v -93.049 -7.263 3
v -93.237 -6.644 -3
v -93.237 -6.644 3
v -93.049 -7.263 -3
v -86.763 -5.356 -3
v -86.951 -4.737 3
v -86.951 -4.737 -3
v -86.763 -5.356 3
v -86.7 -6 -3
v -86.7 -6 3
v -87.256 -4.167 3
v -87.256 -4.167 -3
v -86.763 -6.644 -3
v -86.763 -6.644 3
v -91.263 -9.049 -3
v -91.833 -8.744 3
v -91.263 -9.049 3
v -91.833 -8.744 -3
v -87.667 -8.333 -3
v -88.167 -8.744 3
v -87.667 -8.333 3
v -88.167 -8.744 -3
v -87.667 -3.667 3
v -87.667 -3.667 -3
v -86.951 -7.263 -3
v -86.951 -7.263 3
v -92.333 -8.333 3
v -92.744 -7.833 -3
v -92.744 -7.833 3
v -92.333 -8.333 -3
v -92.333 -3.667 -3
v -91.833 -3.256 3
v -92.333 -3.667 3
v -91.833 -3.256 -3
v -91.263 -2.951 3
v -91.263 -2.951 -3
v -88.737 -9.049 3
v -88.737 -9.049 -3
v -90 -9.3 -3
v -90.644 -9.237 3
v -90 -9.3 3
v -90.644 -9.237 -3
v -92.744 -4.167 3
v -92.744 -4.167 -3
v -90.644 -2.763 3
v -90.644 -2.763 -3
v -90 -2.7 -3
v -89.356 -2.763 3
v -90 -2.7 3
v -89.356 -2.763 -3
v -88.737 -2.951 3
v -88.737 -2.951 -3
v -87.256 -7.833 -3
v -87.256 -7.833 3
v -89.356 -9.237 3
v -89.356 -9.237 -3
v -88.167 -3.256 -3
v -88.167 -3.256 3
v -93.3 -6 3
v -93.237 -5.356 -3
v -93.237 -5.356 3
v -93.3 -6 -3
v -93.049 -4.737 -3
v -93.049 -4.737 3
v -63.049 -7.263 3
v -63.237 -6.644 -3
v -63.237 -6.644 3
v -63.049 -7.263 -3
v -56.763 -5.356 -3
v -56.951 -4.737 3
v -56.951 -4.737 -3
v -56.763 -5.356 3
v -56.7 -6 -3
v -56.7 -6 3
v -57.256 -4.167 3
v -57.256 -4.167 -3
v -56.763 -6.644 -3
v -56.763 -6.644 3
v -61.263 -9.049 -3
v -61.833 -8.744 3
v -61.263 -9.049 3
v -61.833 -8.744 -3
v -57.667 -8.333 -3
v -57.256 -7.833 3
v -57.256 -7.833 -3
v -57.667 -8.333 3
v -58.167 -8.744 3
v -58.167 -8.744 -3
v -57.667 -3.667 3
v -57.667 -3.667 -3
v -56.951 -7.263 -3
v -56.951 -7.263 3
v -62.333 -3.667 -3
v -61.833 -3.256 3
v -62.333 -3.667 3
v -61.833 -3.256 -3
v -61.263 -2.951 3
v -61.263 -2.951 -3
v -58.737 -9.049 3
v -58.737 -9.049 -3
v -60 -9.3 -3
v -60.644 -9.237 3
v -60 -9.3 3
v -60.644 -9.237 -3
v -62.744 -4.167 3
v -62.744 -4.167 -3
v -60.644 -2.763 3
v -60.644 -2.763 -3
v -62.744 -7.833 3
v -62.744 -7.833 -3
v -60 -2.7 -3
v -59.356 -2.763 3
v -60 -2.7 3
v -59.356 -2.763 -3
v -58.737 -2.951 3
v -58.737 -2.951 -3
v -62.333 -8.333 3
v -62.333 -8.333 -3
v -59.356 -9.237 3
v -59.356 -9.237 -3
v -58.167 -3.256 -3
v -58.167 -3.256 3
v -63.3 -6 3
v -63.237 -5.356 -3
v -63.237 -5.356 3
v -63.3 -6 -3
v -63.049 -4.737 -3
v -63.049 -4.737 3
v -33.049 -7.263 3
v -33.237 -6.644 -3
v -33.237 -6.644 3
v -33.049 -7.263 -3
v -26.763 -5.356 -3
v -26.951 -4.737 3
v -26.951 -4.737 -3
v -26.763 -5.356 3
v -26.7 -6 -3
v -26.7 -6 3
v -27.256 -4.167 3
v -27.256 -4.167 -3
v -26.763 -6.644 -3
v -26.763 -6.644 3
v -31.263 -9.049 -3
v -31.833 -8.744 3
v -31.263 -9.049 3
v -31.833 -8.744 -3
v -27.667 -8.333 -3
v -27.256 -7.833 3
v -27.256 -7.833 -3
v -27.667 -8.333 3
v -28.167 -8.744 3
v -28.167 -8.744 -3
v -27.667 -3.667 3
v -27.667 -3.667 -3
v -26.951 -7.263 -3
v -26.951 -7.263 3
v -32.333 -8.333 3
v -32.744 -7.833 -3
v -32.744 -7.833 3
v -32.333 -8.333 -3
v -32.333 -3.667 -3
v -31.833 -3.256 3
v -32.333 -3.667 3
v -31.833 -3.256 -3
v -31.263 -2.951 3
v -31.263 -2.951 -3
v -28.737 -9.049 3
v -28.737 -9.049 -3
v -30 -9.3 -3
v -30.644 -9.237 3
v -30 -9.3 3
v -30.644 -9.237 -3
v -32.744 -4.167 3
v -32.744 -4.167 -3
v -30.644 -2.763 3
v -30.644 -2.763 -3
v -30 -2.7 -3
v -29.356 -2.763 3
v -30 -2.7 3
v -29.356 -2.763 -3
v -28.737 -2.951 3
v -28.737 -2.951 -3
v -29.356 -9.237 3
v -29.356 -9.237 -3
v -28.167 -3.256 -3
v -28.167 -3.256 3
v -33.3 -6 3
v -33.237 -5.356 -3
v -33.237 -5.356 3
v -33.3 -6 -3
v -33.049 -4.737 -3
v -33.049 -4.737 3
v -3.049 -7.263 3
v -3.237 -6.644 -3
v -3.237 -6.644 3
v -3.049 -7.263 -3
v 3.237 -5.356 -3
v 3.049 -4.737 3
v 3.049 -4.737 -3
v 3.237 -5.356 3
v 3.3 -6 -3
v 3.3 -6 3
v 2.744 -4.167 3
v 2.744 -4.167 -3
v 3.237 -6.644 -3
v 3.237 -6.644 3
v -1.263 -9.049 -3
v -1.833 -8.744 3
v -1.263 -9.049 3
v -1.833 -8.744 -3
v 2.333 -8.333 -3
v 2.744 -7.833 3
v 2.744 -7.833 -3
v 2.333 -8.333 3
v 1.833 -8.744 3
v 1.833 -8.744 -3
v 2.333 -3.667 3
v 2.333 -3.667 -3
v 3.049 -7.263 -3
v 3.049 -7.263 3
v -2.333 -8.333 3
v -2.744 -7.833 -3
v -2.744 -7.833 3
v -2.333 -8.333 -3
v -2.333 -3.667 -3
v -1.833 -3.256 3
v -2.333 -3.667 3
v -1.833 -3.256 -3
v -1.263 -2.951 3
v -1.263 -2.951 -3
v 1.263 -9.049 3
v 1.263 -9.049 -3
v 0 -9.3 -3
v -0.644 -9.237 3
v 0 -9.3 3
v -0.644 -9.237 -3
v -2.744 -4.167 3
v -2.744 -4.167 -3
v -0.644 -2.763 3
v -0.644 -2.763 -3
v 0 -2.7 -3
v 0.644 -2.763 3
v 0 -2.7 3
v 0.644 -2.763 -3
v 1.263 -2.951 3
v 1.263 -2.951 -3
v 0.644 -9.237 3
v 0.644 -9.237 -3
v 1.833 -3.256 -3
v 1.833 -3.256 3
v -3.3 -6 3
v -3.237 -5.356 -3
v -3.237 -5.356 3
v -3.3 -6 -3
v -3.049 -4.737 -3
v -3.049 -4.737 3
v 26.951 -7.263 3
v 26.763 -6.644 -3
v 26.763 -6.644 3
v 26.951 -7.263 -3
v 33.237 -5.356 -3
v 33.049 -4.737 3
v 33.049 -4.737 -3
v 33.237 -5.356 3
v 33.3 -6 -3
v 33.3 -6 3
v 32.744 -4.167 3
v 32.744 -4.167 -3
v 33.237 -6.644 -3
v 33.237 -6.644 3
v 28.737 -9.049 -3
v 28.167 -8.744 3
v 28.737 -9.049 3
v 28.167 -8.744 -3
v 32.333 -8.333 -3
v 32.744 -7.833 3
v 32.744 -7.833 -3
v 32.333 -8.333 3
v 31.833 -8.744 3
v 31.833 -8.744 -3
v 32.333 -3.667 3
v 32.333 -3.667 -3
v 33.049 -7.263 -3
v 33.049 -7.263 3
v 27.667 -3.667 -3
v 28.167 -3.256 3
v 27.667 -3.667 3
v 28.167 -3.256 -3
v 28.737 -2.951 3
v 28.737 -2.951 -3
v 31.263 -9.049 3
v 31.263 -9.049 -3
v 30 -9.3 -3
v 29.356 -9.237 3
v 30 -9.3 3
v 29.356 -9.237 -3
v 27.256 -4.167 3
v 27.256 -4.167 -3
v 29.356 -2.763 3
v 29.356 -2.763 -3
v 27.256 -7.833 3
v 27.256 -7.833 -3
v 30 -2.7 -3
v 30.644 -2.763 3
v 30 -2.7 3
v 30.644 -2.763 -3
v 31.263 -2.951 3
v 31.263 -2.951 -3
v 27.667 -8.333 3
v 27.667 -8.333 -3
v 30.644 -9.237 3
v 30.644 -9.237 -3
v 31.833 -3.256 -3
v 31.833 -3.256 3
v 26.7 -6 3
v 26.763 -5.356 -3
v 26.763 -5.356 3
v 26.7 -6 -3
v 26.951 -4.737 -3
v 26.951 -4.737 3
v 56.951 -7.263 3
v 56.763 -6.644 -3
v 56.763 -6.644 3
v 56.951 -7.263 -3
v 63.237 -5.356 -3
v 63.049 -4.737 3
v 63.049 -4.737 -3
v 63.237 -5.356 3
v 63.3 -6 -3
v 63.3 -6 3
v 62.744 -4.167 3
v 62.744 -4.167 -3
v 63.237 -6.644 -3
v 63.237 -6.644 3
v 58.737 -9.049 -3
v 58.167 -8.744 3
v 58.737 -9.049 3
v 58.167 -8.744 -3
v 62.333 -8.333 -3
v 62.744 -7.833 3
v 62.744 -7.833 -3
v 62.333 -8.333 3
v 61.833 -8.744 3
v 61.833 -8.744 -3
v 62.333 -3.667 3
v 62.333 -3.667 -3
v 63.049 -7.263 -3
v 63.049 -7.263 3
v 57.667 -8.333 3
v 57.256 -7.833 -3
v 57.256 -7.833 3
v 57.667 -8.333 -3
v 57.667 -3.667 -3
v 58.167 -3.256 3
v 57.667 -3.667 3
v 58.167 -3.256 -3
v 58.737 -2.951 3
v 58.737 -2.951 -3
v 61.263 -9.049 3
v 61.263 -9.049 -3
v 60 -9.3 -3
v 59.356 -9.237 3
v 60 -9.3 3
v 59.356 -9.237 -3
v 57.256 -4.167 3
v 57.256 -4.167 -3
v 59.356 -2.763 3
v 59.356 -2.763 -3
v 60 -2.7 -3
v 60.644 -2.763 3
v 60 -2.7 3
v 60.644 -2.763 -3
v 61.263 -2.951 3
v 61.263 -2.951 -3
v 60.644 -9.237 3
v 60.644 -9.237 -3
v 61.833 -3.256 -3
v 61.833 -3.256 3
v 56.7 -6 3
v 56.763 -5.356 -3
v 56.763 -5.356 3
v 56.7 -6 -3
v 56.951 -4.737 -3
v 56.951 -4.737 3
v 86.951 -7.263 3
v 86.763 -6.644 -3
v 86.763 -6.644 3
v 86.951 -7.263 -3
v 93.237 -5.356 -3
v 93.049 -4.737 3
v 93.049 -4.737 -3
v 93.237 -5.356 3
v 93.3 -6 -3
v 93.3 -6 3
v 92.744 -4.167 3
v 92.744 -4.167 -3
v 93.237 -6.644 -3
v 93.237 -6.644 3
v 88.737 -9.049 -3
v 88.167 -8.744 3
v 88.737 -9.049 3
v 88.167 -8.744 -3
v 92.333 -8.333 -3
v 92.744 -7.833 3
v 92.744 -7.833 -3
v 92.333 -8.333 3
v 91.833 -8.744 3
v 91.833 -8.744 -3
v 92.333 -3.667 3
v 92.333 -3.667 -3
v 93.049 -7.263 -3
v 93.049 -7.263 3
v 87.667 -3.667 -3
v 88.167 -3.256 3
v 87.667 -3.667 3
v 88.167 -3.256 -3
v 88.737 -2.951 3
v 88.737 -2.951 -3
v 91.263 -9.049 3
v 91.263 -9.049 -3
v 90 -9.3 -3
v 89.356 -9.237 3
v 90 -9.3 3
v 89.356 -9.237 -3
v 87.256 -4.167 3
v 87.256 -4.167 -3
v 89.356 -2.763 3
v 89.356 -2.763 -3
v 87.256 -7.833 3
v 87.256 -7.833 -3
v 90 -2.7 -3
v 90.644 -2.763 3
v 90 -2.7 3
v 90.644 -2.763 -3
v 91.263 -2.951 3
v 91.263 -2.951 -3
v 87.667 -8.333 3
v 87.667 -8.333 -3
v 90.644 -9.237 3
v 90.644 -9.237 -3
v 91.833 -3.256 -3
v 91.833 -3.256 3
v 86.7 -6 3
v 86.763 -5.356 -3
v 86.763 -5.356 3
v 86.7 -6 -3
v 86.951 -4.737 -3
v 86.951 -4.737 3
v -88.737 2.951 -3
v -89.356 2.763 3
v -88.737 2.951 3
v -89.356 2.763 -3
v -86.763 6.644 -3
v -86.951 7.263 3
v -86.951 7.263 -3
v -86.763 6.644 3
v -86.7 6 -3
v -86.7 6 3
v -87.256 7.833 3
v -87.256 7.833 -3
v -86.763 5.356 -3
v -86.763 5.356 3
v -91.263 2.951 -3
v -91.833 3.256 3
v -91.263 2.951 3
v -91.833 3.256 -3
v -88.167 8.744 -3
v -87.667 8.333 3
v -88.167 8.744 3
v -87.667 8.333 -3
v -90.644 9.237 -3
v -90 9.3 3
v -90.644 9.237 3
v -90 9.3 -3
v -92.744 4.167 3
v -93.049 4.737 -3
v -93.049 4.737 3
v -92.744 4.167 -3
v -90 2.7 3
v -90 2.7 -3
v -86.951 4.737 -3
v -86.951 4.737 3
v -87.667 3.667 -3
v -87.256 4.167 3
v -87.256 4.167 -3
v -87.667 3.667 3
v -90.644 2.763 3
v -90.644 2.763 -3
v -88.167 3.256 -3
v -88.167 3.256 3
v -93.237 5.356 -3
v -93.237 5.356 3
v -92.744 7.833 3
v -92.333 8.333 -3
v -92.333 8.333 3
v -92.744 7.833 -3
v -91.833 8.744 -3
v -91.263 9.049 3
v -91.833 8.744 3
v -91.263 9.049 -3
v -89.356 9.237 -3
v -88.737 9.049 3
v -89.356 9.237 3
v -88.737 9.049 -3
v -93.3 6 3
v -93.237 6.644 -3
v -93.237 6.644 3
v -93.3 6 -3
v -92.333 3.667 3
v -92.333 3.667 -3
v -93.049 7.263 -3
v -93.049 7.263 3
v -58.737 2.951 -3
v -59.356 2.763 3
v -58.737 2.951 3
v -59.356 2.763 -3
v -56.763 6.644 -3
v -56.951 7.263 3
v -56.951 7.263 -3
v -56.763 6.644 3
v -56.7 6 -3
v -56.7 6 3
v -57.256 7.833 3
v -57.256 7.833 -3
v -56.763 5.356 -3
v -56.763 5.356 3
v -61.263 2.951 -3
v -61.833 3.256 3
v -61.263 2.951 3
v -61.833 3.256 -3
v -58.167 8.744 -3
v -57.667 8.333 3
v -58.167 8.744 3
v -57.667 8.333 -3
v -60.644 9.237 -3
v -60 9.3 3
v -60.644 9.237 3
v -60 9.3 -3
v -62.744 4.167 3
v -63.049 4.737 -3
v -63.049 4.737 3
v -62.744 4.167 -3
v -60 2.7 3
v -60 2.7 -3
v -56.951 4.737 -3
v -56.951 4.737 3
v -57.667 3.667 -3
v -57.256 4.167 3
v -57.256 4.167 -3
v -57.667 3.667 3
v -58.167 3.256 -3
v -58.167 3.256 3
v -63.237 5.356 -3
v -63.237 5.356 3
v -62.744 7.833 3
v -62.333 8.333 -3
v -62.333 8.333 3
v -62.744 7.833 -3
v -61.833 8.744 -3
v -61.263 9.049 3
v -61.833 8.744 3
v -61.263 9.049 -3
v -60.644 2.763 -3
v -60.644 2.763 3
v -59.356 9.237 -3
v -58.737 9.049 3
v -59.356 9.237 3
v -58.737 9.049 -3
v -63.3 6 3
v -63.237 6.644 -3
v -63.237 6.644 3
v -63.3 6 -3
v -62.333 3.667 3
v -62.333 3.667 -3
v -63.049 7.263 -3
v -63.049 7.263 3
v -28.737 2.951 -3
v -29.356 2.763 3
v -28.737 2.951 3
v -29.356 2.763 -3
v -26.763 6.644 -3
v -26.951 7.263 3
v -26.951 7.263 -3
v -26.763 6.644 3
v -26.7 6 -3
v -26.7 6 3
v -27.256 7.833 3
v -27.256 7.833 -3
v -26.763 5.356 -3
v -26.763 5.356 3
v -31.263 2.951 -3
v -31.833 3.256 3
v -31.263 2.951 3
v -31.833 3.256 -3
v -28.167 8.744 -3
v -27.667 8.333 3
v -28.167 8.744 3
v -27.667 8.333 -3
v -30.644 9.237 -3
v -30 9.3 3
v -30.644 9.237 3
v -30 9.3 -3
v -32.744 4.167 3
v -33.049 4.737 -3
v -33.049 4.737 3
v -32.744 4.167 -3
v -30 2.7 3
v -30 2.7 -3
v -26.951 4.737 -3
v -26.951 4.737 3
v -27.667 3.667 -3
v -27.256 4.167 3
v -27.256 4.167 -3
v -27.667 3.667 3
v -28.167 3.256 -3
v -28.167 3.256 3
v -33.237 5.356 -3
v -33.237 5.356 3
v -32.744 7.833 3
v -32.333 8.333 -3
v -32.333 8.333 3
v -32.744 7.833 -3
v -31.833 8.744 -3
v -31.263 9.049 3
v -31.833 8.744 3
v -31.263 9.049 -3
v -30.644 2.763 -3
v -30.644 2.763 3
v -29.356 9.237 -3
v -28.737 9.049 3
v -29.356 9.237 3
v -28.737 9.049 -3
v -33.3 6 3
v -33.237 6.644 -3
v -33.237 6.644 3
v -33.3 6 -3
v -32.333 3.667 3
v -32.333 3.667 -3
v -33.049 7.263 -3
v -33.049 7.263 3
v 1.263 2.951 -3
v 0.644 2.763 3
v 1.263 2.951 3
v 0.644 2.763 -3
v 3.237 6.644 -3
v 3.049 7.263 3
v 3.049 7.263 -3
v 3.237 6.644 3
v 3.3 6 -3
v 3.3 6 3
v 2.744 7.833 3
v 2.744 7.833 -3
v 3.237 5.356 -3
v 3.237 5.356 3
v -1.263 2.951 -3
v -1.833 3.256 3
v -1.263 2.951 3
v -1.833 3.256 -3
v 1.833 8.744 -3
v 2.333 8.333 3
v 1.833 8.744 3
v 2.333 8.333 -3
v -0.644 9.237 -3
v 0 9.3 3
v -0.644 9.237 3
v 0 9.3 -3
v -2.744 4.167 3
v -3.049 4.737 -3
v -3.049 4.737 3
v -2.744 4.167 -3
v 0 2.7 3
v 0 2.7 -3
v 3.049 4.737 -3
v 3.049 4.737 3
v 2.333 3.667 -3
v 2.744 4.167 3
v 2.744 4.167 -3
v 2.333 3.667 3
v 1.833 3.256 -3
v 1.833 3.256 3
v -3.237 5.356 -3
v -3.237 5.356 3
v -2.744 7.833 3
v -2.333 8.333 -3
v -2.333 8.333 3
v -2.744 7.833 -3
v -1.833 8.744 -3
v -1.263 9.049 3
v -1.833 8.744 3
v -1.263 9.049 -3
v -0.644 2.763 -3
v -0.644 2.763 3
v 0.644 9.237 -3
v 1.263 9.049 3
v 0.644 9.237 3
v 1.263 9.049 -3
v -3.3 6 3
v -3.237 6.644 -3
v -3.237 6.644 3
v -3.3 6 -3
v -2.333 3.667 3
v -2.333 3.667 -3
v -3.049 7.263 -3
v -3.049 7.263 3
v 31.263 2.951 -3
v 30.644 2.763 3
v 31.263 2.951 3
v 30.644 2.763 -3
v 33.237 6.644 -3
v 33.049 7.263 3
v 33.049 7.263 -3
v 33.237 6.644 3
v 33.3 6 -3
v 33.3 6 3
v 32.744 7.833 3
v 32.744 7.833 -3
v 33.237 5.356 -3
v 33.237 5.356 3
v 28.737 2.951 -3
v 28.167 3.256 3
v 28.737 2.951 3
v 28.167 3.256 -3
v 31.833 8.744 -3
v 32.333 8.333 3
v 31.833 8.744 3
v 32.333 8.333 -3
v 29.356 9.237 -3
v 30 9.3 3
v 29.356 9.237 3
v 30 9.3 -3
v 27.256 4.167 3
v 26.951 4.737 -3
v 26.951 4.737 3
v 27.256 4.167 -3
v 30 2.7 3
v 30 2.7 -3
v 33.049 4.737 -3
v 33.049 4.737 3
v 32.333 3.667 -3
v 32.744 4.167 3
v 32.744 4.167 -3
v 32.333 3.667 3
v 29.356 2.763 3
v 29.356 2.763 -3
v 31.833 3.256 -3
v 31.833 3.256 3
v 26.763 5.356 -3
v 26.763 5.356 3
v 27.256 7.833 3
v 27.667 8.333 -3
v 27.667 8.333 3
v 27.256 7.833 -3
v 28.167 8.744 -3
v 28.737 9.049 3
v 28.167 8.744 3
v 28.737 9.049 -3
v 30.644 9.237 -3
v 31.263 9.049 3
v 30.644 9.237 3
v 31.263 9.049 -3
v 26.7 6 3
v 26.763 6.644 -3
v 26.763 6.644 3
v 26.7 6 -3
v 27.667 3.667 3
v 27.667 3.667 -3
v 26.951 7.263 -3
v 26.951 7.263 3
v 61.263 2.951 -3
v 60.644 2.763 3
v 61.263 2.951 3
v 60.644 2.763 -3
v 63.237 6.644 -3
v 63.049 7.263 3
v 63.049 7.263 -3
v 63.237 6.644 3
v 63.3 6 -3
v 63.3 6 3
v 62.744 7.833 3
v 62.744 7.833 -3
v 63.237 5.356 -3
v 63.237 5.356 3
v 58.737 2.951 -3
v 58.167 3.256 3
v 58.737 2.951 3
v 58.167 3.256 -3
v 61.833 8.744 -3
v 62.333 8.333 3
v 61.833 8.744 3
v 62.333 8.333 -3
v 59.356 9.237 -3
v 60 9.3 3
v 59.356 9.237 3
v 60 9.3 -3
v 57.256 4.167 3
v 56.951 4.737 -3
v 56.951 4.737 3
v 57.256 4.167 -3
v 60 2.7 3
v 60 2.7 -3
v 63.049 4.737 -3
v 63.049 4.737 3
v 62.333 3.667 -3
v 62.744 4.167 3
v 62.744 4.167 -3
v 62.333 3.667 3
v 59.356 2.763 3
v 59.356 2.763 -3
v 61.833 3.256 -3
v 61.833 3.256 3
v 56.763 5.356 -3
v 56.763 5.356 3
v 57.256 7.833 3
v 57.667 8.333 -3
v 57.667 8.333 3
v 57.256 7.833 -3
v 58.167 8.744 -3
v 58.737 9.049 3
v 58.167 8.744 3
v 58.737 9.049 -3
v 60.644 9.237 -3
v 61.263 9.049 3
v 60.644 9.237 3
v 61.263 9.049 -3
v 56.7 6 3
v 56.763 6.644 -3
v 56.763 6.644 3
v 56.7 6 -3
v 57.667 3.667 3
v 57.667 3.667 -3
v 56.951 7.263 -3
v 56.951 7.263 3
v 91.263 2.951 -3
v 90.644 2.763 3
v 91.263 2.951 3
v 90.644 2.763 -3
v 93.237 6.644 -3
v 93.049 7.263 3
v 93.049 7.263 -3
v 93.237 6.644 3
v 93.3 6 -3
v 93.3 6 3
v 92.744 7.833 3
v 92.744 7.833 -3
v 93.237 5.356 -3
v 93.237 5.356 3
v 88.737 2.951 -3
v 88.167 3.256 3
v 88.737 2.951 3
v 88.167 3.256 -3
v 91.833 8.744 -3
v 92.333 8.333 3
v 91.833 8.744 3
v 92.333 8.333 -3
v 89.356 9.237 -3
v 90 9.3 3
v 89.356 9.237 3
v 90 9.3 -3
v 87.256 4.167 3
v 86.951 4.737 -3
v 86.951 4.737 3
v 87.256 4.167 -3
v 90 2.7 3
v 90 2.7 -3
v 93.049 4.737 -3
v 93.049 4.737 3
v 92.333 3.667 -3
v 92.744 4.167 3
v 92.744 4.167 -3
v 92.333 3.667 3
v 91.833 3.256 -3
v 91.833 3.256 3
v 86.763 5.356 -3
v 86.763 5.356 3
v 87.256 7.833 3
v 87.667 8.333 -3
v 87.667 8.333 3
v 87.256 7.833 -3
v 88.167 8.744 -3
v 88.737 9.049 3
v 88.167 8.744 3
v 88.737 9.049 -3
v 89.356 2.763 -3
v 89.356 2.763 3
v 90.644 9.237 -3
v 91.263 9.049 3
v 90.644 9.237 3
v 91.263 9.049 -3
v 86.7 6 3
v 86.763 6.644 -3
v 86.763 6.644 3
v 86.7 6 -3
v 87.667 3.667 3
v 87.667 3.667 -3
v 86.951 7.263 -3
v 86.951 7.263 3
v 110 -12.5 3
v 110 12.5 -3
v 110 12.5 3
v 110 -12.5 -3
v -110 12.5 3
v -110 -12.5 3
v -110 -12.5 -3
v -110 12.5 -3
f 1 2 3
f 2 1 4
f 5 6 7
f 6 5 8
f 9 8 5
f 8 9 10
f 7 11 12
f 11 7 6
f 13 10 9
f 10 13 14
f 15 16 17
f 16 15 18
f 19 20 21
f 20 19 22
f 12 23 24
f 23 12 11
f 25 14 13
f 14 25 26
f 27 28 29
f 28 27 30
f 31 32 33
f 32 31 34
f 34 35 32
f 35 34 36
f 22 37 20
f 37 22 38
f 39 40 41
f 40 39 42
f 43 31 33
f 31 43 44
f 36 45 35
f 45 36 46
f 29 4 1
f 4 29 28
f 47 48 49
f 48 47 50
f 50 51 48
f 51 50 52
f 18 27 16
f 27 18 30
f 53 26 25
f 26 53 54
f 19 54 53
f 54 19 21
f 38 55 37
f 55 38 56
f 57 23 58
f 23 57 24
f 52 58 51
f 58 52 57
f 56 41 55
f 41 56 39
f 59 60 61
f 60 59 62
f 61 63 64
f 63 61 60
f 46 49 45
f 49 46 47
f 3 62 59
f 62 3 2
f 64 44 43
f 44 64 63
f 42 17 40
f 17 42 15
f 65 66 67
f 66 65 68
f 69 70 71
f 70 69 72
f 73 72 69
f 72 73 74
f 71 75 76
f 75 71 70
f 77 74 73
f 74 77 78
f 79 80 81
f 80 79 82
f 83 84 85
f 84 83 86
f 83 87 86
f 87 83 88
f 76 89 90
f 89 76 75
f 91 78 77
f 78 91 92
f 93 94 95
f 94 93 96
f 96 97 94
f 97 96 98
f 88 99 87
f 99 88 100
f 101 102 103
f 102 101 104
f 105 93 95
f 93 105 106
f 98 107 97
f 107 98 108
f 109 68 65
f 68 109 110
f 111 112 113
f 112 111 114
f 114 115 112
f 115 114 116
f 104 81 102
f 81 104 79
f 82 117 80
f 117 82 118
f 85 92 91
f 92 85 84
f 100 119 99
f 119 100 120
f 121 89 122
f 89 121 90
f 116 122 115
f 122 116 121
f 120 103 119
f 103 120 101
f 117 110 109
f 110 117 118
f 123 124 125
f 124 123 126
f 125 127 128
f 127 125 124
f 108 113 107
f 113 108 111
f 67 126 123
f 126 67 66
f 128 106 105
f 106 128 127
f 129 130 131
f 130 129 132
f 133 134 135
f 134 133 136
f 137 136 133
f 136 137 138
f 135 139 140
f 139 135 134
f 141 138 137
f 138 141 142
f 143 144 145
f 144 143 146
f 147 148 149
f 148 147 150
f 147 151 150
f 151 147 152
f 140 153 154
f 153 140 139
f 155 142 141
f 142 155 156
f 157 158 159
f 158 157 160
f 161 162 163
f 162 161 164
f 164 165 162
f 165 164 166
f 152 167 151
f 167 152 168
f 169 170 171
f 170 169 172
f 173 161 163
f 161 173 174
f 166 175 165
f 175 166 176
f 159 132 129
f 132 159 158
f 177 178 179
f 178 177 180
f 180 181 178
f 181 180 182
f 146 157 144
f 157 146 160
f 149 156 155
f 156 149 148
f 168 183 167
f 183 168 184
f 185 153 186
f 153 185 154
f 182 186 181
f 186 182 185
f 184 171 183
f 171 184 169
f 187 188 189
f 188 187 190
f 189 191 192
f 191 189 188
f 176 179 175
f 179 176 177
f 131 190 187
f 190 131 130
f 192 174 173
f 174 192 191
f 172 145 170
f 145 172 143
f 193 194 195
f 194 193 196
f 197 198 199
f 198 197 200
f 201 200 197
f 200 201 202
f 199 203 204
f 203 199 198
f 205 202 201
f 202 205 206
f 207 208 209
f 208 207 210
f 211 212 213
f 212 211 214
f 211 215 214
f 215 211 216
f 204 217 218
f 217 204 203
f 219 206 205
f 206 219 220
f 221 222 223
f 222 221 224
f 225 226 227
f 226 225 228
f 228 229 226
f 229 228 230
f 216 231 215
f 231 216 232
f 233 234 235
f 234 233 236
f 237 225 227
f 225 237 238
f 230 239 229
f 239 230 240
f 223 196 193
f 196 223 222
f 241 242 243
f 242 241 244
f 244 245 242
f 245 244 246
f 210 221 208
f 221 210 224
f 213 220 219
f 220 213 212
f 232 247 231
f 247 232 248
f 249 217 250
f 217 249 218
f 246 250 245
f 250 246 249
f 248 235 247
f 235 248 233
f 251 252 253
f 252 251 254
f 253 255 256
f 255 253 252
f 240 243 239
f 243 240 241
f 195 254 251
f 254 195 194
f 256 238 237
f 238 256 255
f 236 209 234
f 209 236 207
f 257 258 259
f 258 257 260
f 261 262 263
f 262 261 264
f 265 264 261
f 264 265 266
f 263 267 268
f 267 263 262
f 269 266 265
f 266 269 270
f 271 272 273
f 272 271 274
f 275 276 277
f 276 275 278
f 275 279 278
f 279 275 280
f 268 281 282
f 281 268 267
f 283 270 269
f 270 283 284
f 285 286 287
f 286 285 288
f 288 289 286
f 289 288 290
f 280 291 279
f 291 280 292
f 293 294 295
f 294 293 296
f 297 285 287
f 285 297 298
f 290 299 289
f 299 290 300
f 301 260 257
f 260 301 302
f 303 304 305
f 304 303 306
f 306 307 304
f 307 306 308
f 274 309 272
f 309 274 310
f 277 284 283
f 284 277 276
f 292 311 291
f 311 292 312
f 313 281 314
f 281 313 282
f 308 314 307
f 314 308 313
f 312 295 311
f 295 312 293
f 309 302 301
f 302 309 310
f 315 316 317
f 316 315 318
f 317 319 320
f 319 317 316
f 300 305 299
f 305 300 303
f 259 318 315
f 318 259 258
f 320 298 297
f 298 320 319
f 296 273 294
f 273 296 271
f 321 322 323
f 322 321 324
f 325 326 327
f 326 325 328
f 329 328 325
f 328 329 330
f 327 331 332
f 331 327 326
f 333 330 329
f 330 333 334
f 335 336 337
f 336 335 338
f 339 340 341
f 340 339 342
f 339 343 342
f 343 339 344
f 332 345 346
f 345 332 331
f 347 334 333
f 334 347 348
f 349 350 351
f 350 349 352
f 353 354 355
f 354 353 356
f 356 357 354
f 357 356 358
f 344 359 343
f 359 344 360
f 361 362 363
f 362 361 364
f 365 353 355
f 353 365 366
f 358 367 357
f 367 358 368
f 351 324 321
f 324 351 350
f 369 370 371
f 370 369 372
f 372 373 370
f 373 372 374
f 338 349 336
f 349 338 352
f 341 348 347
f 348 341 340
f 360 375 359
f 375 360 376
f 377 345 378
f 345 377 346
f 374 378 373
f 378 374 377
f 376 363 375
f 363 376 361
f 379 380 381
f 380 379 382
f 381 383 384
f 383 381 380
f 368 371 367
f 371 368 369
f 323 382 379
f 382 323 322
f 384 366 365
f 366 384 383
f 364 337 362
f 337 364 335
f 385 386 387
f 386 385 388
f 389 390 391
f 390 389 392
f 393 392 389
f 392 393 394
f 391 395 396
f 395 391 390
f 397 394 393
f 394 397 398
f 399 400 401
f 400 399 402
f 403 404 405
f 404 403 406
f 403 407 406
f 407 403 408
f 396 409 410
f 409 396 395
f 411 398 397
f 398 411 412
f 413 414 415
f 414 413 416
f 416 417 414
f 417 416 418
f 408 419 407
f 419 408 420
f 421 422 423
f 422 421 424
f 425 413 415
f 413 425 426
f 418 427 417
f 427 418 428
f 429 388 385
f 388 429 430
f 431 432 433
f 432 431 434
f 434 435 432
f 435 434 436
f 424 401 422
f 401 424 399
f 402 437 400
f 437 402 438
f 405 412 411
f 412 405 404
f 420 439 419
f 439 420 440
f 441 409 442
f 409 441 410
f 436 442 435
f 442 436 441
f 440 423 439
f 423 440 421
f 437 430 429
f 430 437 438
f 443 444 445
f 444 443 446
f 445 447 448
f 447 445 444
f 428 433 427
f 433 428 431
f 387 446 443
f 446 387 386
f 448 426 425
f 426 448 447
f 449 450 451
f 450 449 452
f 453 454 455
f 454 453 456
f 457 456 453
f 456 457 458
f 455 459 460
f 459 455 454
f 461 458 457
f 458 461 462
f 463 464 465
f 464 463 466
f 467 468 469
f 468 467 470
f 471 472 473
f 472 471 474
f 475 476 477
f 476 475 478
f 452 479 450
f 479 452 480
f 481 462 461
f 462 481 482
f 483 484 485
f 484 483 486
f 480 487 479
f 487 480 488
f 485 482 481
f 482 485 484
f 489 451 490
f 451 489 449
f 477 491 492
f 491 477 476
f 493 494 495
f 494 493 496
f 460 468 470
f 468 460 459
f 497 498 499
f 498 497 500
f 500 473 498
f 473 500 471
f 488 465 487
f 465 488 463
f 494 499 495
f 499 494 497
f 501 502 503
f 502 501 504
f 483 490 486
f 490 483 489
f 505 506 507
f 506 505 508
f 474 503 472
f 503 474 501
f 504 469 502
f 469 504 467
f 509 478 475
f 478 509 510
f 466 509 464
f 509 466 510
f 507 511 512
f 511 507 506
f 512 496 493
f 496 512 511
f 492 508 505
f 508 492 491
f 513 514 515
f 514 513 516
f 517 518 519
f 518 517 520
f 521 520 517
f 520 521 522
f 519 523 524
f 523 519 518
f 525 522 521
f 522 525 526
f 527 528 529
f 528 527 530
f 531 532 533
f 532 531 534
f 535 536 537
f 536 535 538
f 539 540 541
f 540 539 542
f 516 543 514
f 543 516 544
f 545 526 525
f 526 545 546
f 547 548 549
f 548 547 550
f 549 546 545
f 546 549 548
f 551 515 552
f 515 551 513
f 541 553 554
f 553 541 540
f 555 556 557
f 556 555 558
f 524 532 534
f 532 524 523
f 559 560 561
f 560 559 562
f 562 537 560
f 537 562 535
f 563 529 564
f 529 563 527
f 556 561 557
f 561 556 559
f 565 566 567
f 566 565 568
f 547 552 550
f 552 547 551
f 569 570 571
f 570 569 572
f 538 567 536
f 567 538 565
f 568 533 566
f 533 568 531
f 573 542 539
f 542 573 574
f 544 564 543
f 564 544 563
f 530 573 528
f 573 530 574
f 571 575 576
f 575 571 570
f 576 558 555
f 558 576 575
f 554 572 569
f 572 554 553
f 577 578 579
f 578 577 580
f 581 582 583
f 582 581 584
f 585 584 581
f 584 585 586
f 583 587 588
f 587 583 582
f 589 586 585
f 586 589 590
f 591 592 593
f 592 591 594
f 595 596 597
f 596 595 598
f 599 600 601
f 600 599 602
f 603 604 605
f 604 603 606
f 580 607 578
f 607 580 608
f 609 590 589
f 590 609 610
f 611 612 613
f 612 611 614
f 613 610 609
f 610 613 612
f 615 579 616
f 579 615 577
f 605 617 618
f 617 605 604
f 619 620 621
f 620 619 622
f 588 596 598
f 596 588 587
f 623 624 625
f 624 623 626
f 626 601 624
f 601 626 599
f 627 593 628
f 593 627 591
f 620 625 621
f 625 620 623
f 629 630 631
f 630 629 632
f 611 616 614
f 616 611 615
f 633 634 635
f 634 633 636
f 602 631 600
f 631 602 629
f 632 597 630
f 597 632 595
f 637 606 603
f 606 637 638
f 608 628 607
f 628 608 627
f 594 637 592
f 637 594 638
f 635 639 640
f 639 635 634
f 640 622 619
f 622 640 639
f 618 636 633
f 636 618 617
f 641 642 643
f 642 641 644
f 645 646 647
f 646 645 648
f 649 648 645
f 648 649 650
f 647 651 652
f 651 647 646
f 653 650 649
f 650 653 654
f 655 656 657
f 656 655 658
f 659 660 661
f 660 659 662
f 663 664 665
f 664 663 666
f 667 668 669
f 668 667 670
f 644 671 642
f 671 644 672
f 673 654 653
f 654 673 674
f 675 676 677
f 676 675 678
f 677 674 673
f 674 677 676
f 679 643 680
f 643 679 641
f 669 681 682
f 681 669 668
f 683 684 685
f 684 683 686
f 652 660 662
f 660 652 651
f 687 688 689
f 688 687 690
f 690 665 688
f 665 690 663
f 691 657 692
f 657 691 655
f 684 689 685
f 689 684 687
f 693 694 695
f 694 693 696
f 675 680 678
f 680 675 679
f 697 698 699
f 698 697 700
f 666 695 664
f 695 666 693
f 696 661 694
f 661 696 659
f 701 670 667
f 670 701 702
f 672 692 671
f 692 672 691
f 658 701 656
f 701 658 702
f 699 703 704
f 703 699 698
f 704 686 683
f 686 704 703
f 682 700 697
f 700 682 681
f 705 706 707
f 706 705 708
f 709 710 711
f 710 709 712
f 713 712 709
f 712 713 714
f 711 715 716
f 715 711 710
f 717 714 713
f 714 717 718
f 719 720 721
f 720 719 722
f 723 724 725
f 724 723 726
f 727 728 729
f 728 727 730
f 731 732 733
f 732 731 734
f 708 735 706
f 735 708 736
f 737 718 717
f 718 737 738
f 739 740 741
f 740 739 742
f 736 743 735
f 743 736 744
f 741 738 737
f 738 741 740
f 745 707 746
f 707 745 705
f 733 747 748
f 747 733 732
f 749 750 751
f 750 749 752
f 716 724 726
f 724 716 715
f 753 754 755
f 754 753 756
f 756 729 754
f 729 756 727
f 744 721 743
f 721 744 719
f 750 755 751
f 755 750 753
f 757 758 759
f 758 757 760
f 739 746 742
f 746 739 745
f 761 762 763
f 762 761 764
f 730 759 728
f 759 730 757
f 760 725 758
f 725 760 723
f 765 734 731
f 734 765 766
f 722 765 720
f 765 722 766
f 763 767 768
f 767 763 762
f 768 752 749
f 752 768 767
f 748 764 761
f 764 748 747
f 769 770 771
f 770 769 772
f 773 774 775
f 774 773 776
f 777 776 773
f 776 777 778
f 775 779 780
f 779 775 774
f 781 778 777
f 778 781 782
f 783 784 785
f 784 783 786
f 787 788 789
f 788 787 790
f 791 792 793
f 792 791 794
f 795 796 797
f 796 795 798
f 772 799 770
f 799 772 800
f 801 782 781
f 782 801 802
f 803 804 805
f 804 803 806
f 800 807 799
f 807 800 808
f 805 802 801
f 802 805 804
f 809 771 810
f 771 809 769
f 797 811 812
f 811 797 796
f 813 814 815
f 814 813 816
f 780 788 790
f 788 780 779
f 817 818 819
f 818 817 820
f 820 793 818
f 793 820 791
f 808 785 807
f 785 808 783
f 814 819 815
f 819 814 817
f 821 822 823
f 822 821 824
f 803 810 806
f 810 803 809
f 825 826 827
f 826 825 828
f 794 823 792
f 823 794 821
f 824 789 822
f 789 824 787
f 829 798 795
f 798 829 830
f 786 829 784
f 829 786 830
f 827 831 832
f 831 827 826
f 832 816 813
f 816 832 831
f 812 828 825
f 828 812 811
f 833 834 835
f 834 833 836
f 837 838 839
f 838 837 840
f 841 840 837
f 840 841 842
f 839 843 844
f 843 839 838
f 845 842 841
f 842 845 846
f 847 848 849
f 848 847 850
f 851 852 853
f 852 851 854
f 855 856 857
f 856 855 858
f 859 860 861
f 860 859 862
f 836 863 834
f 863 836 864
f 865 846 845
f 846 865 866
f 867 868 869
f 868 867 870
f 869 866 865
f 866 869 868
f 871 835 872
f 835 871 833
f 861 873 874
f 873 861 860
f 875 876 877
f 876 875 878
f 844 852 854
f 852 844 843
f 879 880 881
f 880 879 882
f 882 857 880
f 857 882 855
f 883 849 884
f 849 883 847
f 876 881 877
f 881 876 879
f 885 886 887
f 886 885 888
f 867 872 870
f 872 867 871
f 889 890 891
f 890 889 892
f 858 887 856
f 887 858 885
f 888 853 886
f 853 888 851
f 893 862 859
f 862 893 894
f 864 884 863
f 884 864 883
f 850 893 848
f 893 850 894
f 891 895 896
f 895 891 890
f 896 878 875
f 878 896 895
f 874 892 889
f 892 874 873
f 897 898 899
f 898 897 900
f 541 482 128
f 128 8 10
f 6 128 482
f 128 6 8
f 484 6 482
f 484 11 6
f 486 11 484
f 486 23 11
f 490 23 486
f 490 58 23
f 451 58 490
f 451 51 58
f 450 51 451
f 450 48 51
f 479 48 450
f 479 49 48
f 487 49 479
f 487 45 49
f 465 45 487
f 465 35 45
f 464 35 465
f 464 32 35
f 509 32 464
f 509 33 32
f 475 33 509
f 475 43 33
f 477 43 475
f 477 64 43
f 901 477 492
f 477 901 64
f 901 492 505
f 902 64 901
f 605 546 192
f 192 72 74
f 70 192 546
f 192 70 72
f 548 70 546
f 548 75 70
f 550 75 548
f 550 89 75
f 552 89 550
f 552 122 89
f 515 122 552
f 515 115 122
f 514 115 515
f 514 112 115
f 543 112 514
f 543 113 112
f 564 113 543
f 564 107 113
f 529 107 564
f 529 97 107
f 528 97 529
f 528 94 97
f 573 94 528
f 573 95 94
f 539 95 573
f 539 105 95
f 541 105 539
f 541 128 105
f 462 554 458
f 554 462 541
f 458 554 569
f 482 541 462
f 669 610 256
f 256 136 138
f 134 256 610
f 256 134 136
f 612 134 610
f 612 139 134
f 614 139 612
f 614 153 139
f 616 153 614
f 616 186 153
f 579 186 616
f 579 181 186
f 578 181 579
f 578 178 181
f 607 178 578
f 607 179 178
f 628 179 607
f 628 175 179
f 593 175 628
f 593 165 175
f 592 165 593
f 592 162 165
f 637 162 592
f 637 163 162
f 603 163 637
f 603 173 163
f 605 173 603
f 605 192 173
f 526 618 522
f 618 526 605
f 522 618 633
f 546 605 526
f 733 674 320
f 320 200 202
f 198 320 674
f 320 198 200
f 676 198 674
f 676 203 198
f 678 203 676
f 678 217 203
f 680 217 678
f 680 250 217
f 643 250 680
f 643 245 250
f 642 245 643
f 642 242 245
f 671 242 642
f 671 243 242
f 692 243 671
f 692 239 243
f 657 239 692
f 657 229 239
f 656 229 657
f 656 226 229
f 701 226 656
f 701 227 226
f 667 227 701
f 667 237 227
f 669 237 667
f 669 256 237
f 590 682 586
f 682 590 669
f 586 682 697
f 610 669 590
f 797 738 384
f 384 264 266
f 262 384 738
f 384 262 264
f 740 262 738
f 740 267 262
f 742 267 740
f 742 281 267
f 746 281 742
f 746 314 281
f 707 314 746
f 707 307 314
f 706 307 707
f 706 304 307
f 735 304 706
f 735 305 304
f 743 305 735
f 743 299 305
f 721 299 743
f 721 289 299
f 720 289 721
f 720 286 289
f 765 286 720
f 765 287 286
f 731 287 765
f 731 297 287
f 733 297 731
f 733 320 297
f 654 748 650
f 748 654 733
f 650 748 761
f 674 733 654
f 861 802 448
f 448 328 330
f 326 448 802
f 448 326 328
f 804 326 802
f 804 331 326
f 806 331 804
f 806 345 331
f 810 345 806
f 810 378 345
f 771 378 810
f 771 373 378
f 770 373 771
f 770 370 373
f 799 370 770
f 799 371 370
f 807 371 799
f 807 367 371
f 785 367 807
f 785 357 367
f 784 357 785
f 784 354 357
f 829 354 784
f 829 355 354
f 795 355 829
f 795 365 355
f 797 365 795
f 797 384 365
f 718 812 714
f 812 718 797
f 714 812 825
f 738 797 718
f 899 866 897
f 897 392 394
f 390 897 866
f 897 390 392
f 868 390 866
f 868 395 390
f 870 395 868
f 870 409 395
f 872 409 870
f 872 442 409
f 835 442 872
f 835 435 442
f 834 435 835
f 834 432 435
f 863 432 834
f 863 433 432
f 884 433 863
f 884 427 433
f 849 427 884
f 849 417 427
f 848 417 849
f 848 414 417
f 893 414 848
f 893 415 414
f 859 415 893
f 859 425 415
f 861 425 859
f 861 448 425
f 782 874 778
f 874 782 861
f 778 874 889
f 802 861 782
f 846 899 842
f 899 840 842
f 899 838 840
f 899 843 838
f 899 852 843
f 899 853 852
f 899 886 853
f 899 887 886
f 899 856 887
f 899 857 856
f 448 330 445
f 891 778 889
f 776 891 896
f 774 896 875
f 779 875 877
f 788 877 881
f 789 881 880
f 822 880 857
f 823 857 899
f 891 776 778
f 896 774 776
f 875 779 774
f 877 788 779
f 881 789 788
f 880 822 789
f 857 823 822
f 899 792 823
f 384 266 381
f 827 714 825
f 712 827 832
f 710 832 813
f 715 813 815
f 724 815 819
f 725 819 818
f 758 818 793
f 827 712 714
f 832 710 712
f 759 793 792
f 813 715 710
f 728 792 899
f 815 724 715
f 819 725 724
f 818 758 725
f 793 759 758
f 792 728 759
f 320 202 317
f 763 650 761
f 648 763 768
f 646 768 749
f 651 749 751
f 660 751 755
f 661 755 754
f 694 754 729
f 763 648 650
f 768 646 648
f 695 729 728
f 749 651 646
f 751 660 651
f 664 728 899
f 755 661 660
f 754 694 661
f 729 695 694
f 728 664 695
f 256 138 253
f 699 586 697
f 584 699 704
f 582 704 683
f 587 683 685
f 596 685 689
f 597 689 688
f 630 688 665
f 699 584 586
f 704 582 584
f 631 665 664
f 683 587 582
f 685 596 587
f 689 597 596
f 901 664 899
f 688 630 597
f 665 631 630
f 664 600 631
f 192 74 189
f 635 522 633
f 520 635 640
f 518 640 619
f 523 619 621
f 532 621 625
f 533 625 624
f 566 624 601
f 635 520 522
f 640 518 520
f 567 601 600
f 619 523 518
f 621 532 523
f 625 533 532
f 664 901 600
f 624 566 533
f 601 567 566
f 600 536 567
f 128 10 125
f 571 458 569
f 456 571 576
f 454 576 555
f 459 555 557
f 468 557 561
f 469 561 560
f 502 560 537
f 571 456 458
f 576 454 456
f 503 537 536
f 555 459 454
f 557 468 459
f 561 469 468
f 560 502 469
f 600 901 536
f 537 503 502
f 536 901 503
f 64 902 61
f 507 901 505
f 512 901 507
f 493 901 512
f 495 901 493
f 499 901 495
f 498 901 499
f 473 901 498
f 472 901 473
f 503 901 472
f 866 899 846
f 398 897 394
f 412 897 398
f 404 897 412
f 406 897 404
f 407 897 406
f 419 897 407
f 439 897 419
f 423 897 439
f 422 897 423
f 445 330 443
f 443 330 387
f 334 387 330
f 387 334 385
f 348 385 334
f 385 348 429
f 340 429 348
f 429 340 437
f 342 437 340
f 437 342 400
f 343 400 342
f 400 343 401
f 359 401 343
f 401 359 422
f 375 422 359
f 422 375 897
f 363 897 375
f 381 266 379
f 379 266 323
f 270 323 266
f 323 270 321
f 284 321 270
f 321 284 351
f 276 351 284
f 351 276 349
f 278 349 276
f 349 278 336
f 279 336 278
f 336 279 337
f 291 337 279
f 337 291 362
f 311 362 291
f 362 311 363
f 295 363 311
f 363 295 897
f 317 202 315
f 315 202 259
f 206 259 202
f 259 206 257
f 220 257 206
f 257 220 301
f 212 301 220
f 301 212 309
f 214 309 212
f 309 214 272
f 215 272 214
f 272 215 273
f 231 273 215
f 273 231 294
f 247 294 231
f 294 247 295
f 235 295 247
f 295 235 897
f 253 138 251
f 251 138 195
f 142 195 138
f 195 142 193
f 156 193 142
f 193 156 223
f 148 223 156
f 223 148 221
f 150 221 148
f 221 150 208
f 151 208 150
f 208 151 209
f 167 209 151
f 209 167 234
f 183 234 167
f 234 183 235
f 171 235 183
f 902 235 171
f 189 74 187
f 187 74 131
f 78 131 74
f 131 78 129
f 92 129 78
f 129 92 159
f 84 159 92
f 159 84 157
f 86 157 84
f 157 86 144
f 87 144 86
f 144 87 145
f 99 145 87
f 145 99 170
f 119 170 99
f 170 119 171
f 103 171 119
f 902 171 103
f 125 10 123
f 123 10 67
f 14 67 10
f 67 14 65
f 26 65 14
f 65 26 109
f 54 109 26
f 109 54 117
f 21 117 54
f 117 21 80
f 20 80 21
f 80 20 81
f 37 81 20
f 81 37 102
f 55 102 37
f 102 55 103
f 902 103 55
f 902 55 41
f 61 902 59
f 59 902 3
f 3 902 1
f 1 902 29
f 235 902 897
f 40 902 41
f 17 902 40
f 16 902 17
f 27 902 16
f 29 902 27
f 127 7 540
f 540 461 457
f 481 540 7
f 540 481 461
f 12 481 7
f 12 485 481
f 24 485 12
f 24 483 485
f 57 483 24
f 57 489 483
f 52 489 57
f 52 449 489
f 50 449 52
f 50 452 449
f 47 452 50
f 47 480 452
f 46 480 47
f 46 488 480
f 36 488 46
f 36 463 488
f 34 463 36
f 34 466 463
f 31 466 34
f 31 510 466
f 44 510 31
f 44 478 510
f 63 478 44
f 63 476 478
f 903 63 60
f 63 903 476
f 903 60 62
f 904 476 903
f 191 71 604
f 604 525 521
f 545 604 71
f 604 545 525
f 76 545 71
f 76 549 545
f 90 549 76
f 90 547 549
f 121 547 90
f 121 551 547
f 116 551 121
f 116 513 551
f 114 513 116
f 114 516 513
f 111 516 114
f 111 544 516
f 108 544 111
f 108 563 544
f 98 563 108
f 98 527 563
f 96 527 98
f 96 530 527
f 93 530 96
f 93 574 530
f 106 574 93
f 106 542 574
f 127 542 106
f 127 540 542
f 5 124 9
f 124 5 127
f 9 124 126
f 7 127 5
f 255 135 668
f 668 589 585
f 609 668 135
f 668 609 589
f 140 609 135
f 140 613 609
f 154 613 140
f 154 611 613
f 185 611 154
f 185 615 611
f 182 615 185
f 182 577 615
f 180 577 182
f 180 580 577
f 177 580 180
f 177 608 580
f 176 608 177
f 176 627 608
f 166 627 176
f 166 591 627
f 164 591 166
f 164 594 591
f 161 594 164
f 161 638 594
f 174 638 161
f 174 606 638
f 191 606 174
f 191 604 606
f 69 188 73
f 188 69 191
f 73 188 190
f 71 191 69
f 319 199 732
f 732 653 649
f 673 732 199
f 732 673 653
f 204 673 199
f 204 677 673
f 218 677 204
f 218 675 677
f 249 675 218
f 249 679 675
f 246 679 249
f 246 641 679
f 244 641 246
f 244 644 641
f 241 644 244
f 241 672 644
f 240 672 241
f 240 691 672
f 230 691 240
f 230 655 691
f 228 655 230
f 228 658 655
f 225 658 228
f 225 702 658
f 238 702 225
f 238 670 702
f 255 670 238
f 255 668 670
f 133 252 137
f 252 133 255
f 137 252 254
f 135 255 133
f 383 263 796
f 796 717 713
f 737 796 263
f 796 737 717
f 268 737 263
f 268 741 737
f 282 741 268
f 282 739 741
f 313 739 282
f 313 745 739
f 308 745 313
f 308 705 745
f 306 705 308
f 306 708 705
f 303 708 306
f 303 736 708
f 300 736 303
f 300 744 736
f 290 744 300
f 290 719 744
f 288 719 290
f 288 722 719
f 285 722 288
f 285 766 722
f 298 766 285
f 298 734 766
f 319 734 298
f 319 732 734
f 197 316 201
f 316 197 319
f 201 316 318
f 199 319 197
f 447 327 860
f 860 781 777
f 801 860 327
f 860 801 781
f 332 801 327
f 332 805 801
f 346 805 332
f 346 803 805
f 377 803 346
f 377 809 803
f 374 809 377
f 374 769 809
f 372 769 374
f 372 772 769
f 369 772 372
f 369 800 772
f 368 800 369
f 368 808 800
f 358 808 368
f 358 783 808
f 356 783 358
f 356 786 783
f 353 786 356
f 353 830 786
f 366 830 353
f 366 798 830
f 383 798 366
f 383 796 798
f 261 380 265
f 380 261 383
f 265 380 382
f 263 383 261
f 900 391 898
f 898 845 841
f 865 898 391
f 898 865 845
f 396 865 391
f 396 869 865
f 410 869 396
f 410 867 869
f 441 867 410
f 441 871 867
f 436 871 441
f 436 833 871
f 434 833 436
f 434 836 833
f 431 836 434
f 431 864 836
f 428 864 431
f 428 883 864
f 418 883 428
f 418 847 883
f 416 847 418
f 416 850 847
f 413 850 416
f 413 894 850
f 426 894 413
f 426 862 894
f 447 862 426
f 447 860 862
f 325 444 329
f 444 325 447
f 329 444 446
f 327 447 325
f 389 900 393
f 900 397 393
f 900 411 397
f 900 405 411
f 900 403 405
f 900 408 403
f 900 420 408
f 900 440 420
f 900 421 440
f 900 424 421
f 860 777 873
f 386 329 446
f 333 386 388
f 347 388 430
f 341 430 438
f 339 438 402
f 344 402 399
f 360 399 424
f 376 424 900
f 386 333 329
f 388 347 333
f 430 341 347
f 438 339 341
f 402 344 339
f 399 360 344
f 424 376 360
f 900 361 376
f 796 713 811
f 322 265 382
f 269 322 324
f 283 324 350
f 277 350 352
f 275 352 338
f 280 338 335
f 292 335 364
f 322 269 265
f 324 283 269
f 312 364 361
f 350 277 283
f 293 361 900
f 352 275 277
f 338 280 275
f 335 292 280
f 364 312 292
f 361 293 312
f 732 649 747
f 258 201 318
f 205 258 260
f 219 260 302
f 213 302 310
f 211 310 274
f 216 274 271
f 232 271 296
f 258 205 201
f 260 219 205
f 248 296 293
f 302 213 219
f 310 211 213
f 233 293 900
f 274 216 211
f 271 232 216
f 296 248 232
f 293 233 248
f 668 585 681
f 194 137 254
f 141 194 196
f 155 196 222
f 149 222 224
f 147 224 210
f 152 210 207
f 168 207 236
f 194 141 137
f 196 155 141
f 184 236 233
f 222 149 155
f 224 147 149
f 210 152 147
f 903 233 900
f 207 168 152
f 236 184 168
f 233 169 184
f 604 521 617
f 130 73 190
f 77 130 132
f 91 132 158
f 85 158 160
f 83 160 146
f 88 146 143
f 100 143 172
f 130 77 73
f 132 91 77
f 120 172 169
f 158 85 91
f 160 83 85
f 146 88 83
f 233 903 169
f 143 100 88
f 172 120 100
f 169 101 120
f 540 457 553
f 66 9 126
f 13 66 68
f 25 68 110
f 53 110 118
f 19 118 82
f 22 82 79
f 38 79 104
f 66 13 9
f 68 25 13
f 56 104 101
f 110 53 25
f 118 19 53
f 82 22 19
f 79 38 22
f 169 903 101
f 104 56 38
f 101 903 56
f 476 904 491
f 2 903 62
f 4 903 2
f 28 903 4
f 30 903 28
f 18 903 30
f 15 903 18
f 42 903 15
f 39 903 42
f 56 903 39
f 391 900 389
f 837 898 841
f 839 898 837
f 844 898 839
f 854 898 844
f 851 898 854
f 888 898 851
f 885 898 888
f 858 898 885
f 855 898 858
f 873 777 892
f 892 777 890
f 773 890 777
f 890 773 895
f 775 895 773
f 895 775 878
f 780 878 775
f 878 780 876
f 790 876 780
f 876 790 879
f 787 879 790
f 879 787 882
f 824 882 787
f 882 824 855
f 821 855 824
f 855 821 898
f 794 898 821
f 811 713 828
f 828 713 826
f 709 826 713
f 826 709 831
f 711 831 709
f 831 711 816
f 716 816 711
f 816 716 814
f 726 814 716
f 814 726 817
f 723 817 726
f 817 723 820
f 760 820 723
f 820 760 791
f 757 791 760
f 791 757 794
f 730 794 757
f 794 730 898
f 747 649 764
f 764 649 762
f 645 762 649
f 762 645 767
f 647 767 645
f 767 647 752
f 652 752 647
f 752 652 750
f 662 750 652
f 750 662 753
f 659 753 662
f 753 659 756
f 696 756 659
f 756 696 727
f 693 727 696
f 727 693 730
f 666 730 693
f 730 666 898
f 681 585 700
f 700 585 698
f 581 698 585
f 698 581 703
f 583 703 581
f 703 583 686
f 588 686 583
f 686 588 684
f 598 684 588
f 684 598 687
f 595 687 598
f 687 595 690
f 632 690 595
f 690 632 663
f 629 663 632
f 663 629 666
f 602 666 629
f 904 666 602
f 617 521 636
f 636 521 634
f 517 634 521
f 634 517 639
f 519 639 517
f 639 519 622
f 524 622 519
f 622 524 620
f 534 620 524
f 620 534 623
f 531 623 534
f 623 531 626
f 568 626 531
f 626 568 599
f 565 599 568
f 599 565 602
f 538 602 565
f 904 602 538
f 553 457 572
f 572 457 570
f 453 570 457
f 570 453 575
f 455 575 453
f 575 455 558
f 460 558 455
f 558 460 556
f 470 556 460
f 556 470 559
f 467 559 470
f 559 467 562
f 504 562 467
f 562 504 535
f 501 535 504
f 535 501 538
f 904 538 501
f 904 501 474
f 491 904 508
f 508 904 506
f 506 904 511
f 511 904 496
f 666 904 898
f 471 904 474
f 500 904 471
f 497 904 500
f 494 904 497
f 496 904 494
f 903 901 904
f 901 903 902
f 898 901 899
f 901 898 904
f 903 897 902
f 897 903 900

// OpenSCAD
$fn = 32;

// ----------------------------------------------------------------------
// Hole bar, 7 x Ø6.6
// tworows layout, 20 mm edge offset
// ----------------------------------------------------------------------

// --- parameters (mm) ---
bar_w = 25;       // bar width (Y)
bar_t = 6;        // bar thickness (Z)
holes = 7;        // holes per row
hole_d = 6.6;     // hole diameter
edge = 20;        // offset from the bar end to the first hole
pitch = 30;       // pitch between neighbouring holes
row_offset = 12;  // distance between the two rows

// --- derived feature positions (mm) ---
span = (holes - 1) * pitch;   // = 180   distance between the end holes
bar_l = span + 2 * edge;      // = 220   overall bar length
start_x = -bar_l / 2 + edge;  // = -90   X of the first hole
feature_centers = [
  [start_x + 0 * pitch, -row_offset / 2],
  [start_x + 1 * pitch, -row_offset / 2],
  [start_x + 2 * pitch, -row_offset / 2],
  [start_x + 3 * pitch, -row_offset / 2],
  [start_x + 4 * pitch, -row_offset / 2],
  [start_x + 5 * pitch, -row_offset / 2],
  [start_x + 6 * pitch, -row_offset / 2]
];   // hole centres of the first row
row2_centers = [
  [start_x + 0 * pitch, row_offset / 2],
  [start_x + 1 * pitch, row_offset / 2],
  [start_x + 2 * pitch, row_offset / 2],
  [start_x + 3 * pitch, row_offset / 2],
  [start_x + 4 * pitch, row_offset / 2],
  [start_x + 5 * pitch, row_offset / 2],
  [start_x + 6 * pitch, row_offset / 2]
];   // hole centres of the second row

// bar with two rows of holes, both read from their own centre arrays
difference() {
  translate([-bar_l / 2, -bar_w / 2, -bar_t / 2]) cube([bar_l, bar_w, bar_t]);
  for (centre = feature_centers)
    translate([centre[0], centre[1], 0])
      cylinder(d = hole_d, h = bar_t + 2, center = true);
  for (centre = row2_centers)
    translate([centre[0], centre[1], 0])
      cylinder(d = hole_d, h = bar_t + 2, center = true);
}
